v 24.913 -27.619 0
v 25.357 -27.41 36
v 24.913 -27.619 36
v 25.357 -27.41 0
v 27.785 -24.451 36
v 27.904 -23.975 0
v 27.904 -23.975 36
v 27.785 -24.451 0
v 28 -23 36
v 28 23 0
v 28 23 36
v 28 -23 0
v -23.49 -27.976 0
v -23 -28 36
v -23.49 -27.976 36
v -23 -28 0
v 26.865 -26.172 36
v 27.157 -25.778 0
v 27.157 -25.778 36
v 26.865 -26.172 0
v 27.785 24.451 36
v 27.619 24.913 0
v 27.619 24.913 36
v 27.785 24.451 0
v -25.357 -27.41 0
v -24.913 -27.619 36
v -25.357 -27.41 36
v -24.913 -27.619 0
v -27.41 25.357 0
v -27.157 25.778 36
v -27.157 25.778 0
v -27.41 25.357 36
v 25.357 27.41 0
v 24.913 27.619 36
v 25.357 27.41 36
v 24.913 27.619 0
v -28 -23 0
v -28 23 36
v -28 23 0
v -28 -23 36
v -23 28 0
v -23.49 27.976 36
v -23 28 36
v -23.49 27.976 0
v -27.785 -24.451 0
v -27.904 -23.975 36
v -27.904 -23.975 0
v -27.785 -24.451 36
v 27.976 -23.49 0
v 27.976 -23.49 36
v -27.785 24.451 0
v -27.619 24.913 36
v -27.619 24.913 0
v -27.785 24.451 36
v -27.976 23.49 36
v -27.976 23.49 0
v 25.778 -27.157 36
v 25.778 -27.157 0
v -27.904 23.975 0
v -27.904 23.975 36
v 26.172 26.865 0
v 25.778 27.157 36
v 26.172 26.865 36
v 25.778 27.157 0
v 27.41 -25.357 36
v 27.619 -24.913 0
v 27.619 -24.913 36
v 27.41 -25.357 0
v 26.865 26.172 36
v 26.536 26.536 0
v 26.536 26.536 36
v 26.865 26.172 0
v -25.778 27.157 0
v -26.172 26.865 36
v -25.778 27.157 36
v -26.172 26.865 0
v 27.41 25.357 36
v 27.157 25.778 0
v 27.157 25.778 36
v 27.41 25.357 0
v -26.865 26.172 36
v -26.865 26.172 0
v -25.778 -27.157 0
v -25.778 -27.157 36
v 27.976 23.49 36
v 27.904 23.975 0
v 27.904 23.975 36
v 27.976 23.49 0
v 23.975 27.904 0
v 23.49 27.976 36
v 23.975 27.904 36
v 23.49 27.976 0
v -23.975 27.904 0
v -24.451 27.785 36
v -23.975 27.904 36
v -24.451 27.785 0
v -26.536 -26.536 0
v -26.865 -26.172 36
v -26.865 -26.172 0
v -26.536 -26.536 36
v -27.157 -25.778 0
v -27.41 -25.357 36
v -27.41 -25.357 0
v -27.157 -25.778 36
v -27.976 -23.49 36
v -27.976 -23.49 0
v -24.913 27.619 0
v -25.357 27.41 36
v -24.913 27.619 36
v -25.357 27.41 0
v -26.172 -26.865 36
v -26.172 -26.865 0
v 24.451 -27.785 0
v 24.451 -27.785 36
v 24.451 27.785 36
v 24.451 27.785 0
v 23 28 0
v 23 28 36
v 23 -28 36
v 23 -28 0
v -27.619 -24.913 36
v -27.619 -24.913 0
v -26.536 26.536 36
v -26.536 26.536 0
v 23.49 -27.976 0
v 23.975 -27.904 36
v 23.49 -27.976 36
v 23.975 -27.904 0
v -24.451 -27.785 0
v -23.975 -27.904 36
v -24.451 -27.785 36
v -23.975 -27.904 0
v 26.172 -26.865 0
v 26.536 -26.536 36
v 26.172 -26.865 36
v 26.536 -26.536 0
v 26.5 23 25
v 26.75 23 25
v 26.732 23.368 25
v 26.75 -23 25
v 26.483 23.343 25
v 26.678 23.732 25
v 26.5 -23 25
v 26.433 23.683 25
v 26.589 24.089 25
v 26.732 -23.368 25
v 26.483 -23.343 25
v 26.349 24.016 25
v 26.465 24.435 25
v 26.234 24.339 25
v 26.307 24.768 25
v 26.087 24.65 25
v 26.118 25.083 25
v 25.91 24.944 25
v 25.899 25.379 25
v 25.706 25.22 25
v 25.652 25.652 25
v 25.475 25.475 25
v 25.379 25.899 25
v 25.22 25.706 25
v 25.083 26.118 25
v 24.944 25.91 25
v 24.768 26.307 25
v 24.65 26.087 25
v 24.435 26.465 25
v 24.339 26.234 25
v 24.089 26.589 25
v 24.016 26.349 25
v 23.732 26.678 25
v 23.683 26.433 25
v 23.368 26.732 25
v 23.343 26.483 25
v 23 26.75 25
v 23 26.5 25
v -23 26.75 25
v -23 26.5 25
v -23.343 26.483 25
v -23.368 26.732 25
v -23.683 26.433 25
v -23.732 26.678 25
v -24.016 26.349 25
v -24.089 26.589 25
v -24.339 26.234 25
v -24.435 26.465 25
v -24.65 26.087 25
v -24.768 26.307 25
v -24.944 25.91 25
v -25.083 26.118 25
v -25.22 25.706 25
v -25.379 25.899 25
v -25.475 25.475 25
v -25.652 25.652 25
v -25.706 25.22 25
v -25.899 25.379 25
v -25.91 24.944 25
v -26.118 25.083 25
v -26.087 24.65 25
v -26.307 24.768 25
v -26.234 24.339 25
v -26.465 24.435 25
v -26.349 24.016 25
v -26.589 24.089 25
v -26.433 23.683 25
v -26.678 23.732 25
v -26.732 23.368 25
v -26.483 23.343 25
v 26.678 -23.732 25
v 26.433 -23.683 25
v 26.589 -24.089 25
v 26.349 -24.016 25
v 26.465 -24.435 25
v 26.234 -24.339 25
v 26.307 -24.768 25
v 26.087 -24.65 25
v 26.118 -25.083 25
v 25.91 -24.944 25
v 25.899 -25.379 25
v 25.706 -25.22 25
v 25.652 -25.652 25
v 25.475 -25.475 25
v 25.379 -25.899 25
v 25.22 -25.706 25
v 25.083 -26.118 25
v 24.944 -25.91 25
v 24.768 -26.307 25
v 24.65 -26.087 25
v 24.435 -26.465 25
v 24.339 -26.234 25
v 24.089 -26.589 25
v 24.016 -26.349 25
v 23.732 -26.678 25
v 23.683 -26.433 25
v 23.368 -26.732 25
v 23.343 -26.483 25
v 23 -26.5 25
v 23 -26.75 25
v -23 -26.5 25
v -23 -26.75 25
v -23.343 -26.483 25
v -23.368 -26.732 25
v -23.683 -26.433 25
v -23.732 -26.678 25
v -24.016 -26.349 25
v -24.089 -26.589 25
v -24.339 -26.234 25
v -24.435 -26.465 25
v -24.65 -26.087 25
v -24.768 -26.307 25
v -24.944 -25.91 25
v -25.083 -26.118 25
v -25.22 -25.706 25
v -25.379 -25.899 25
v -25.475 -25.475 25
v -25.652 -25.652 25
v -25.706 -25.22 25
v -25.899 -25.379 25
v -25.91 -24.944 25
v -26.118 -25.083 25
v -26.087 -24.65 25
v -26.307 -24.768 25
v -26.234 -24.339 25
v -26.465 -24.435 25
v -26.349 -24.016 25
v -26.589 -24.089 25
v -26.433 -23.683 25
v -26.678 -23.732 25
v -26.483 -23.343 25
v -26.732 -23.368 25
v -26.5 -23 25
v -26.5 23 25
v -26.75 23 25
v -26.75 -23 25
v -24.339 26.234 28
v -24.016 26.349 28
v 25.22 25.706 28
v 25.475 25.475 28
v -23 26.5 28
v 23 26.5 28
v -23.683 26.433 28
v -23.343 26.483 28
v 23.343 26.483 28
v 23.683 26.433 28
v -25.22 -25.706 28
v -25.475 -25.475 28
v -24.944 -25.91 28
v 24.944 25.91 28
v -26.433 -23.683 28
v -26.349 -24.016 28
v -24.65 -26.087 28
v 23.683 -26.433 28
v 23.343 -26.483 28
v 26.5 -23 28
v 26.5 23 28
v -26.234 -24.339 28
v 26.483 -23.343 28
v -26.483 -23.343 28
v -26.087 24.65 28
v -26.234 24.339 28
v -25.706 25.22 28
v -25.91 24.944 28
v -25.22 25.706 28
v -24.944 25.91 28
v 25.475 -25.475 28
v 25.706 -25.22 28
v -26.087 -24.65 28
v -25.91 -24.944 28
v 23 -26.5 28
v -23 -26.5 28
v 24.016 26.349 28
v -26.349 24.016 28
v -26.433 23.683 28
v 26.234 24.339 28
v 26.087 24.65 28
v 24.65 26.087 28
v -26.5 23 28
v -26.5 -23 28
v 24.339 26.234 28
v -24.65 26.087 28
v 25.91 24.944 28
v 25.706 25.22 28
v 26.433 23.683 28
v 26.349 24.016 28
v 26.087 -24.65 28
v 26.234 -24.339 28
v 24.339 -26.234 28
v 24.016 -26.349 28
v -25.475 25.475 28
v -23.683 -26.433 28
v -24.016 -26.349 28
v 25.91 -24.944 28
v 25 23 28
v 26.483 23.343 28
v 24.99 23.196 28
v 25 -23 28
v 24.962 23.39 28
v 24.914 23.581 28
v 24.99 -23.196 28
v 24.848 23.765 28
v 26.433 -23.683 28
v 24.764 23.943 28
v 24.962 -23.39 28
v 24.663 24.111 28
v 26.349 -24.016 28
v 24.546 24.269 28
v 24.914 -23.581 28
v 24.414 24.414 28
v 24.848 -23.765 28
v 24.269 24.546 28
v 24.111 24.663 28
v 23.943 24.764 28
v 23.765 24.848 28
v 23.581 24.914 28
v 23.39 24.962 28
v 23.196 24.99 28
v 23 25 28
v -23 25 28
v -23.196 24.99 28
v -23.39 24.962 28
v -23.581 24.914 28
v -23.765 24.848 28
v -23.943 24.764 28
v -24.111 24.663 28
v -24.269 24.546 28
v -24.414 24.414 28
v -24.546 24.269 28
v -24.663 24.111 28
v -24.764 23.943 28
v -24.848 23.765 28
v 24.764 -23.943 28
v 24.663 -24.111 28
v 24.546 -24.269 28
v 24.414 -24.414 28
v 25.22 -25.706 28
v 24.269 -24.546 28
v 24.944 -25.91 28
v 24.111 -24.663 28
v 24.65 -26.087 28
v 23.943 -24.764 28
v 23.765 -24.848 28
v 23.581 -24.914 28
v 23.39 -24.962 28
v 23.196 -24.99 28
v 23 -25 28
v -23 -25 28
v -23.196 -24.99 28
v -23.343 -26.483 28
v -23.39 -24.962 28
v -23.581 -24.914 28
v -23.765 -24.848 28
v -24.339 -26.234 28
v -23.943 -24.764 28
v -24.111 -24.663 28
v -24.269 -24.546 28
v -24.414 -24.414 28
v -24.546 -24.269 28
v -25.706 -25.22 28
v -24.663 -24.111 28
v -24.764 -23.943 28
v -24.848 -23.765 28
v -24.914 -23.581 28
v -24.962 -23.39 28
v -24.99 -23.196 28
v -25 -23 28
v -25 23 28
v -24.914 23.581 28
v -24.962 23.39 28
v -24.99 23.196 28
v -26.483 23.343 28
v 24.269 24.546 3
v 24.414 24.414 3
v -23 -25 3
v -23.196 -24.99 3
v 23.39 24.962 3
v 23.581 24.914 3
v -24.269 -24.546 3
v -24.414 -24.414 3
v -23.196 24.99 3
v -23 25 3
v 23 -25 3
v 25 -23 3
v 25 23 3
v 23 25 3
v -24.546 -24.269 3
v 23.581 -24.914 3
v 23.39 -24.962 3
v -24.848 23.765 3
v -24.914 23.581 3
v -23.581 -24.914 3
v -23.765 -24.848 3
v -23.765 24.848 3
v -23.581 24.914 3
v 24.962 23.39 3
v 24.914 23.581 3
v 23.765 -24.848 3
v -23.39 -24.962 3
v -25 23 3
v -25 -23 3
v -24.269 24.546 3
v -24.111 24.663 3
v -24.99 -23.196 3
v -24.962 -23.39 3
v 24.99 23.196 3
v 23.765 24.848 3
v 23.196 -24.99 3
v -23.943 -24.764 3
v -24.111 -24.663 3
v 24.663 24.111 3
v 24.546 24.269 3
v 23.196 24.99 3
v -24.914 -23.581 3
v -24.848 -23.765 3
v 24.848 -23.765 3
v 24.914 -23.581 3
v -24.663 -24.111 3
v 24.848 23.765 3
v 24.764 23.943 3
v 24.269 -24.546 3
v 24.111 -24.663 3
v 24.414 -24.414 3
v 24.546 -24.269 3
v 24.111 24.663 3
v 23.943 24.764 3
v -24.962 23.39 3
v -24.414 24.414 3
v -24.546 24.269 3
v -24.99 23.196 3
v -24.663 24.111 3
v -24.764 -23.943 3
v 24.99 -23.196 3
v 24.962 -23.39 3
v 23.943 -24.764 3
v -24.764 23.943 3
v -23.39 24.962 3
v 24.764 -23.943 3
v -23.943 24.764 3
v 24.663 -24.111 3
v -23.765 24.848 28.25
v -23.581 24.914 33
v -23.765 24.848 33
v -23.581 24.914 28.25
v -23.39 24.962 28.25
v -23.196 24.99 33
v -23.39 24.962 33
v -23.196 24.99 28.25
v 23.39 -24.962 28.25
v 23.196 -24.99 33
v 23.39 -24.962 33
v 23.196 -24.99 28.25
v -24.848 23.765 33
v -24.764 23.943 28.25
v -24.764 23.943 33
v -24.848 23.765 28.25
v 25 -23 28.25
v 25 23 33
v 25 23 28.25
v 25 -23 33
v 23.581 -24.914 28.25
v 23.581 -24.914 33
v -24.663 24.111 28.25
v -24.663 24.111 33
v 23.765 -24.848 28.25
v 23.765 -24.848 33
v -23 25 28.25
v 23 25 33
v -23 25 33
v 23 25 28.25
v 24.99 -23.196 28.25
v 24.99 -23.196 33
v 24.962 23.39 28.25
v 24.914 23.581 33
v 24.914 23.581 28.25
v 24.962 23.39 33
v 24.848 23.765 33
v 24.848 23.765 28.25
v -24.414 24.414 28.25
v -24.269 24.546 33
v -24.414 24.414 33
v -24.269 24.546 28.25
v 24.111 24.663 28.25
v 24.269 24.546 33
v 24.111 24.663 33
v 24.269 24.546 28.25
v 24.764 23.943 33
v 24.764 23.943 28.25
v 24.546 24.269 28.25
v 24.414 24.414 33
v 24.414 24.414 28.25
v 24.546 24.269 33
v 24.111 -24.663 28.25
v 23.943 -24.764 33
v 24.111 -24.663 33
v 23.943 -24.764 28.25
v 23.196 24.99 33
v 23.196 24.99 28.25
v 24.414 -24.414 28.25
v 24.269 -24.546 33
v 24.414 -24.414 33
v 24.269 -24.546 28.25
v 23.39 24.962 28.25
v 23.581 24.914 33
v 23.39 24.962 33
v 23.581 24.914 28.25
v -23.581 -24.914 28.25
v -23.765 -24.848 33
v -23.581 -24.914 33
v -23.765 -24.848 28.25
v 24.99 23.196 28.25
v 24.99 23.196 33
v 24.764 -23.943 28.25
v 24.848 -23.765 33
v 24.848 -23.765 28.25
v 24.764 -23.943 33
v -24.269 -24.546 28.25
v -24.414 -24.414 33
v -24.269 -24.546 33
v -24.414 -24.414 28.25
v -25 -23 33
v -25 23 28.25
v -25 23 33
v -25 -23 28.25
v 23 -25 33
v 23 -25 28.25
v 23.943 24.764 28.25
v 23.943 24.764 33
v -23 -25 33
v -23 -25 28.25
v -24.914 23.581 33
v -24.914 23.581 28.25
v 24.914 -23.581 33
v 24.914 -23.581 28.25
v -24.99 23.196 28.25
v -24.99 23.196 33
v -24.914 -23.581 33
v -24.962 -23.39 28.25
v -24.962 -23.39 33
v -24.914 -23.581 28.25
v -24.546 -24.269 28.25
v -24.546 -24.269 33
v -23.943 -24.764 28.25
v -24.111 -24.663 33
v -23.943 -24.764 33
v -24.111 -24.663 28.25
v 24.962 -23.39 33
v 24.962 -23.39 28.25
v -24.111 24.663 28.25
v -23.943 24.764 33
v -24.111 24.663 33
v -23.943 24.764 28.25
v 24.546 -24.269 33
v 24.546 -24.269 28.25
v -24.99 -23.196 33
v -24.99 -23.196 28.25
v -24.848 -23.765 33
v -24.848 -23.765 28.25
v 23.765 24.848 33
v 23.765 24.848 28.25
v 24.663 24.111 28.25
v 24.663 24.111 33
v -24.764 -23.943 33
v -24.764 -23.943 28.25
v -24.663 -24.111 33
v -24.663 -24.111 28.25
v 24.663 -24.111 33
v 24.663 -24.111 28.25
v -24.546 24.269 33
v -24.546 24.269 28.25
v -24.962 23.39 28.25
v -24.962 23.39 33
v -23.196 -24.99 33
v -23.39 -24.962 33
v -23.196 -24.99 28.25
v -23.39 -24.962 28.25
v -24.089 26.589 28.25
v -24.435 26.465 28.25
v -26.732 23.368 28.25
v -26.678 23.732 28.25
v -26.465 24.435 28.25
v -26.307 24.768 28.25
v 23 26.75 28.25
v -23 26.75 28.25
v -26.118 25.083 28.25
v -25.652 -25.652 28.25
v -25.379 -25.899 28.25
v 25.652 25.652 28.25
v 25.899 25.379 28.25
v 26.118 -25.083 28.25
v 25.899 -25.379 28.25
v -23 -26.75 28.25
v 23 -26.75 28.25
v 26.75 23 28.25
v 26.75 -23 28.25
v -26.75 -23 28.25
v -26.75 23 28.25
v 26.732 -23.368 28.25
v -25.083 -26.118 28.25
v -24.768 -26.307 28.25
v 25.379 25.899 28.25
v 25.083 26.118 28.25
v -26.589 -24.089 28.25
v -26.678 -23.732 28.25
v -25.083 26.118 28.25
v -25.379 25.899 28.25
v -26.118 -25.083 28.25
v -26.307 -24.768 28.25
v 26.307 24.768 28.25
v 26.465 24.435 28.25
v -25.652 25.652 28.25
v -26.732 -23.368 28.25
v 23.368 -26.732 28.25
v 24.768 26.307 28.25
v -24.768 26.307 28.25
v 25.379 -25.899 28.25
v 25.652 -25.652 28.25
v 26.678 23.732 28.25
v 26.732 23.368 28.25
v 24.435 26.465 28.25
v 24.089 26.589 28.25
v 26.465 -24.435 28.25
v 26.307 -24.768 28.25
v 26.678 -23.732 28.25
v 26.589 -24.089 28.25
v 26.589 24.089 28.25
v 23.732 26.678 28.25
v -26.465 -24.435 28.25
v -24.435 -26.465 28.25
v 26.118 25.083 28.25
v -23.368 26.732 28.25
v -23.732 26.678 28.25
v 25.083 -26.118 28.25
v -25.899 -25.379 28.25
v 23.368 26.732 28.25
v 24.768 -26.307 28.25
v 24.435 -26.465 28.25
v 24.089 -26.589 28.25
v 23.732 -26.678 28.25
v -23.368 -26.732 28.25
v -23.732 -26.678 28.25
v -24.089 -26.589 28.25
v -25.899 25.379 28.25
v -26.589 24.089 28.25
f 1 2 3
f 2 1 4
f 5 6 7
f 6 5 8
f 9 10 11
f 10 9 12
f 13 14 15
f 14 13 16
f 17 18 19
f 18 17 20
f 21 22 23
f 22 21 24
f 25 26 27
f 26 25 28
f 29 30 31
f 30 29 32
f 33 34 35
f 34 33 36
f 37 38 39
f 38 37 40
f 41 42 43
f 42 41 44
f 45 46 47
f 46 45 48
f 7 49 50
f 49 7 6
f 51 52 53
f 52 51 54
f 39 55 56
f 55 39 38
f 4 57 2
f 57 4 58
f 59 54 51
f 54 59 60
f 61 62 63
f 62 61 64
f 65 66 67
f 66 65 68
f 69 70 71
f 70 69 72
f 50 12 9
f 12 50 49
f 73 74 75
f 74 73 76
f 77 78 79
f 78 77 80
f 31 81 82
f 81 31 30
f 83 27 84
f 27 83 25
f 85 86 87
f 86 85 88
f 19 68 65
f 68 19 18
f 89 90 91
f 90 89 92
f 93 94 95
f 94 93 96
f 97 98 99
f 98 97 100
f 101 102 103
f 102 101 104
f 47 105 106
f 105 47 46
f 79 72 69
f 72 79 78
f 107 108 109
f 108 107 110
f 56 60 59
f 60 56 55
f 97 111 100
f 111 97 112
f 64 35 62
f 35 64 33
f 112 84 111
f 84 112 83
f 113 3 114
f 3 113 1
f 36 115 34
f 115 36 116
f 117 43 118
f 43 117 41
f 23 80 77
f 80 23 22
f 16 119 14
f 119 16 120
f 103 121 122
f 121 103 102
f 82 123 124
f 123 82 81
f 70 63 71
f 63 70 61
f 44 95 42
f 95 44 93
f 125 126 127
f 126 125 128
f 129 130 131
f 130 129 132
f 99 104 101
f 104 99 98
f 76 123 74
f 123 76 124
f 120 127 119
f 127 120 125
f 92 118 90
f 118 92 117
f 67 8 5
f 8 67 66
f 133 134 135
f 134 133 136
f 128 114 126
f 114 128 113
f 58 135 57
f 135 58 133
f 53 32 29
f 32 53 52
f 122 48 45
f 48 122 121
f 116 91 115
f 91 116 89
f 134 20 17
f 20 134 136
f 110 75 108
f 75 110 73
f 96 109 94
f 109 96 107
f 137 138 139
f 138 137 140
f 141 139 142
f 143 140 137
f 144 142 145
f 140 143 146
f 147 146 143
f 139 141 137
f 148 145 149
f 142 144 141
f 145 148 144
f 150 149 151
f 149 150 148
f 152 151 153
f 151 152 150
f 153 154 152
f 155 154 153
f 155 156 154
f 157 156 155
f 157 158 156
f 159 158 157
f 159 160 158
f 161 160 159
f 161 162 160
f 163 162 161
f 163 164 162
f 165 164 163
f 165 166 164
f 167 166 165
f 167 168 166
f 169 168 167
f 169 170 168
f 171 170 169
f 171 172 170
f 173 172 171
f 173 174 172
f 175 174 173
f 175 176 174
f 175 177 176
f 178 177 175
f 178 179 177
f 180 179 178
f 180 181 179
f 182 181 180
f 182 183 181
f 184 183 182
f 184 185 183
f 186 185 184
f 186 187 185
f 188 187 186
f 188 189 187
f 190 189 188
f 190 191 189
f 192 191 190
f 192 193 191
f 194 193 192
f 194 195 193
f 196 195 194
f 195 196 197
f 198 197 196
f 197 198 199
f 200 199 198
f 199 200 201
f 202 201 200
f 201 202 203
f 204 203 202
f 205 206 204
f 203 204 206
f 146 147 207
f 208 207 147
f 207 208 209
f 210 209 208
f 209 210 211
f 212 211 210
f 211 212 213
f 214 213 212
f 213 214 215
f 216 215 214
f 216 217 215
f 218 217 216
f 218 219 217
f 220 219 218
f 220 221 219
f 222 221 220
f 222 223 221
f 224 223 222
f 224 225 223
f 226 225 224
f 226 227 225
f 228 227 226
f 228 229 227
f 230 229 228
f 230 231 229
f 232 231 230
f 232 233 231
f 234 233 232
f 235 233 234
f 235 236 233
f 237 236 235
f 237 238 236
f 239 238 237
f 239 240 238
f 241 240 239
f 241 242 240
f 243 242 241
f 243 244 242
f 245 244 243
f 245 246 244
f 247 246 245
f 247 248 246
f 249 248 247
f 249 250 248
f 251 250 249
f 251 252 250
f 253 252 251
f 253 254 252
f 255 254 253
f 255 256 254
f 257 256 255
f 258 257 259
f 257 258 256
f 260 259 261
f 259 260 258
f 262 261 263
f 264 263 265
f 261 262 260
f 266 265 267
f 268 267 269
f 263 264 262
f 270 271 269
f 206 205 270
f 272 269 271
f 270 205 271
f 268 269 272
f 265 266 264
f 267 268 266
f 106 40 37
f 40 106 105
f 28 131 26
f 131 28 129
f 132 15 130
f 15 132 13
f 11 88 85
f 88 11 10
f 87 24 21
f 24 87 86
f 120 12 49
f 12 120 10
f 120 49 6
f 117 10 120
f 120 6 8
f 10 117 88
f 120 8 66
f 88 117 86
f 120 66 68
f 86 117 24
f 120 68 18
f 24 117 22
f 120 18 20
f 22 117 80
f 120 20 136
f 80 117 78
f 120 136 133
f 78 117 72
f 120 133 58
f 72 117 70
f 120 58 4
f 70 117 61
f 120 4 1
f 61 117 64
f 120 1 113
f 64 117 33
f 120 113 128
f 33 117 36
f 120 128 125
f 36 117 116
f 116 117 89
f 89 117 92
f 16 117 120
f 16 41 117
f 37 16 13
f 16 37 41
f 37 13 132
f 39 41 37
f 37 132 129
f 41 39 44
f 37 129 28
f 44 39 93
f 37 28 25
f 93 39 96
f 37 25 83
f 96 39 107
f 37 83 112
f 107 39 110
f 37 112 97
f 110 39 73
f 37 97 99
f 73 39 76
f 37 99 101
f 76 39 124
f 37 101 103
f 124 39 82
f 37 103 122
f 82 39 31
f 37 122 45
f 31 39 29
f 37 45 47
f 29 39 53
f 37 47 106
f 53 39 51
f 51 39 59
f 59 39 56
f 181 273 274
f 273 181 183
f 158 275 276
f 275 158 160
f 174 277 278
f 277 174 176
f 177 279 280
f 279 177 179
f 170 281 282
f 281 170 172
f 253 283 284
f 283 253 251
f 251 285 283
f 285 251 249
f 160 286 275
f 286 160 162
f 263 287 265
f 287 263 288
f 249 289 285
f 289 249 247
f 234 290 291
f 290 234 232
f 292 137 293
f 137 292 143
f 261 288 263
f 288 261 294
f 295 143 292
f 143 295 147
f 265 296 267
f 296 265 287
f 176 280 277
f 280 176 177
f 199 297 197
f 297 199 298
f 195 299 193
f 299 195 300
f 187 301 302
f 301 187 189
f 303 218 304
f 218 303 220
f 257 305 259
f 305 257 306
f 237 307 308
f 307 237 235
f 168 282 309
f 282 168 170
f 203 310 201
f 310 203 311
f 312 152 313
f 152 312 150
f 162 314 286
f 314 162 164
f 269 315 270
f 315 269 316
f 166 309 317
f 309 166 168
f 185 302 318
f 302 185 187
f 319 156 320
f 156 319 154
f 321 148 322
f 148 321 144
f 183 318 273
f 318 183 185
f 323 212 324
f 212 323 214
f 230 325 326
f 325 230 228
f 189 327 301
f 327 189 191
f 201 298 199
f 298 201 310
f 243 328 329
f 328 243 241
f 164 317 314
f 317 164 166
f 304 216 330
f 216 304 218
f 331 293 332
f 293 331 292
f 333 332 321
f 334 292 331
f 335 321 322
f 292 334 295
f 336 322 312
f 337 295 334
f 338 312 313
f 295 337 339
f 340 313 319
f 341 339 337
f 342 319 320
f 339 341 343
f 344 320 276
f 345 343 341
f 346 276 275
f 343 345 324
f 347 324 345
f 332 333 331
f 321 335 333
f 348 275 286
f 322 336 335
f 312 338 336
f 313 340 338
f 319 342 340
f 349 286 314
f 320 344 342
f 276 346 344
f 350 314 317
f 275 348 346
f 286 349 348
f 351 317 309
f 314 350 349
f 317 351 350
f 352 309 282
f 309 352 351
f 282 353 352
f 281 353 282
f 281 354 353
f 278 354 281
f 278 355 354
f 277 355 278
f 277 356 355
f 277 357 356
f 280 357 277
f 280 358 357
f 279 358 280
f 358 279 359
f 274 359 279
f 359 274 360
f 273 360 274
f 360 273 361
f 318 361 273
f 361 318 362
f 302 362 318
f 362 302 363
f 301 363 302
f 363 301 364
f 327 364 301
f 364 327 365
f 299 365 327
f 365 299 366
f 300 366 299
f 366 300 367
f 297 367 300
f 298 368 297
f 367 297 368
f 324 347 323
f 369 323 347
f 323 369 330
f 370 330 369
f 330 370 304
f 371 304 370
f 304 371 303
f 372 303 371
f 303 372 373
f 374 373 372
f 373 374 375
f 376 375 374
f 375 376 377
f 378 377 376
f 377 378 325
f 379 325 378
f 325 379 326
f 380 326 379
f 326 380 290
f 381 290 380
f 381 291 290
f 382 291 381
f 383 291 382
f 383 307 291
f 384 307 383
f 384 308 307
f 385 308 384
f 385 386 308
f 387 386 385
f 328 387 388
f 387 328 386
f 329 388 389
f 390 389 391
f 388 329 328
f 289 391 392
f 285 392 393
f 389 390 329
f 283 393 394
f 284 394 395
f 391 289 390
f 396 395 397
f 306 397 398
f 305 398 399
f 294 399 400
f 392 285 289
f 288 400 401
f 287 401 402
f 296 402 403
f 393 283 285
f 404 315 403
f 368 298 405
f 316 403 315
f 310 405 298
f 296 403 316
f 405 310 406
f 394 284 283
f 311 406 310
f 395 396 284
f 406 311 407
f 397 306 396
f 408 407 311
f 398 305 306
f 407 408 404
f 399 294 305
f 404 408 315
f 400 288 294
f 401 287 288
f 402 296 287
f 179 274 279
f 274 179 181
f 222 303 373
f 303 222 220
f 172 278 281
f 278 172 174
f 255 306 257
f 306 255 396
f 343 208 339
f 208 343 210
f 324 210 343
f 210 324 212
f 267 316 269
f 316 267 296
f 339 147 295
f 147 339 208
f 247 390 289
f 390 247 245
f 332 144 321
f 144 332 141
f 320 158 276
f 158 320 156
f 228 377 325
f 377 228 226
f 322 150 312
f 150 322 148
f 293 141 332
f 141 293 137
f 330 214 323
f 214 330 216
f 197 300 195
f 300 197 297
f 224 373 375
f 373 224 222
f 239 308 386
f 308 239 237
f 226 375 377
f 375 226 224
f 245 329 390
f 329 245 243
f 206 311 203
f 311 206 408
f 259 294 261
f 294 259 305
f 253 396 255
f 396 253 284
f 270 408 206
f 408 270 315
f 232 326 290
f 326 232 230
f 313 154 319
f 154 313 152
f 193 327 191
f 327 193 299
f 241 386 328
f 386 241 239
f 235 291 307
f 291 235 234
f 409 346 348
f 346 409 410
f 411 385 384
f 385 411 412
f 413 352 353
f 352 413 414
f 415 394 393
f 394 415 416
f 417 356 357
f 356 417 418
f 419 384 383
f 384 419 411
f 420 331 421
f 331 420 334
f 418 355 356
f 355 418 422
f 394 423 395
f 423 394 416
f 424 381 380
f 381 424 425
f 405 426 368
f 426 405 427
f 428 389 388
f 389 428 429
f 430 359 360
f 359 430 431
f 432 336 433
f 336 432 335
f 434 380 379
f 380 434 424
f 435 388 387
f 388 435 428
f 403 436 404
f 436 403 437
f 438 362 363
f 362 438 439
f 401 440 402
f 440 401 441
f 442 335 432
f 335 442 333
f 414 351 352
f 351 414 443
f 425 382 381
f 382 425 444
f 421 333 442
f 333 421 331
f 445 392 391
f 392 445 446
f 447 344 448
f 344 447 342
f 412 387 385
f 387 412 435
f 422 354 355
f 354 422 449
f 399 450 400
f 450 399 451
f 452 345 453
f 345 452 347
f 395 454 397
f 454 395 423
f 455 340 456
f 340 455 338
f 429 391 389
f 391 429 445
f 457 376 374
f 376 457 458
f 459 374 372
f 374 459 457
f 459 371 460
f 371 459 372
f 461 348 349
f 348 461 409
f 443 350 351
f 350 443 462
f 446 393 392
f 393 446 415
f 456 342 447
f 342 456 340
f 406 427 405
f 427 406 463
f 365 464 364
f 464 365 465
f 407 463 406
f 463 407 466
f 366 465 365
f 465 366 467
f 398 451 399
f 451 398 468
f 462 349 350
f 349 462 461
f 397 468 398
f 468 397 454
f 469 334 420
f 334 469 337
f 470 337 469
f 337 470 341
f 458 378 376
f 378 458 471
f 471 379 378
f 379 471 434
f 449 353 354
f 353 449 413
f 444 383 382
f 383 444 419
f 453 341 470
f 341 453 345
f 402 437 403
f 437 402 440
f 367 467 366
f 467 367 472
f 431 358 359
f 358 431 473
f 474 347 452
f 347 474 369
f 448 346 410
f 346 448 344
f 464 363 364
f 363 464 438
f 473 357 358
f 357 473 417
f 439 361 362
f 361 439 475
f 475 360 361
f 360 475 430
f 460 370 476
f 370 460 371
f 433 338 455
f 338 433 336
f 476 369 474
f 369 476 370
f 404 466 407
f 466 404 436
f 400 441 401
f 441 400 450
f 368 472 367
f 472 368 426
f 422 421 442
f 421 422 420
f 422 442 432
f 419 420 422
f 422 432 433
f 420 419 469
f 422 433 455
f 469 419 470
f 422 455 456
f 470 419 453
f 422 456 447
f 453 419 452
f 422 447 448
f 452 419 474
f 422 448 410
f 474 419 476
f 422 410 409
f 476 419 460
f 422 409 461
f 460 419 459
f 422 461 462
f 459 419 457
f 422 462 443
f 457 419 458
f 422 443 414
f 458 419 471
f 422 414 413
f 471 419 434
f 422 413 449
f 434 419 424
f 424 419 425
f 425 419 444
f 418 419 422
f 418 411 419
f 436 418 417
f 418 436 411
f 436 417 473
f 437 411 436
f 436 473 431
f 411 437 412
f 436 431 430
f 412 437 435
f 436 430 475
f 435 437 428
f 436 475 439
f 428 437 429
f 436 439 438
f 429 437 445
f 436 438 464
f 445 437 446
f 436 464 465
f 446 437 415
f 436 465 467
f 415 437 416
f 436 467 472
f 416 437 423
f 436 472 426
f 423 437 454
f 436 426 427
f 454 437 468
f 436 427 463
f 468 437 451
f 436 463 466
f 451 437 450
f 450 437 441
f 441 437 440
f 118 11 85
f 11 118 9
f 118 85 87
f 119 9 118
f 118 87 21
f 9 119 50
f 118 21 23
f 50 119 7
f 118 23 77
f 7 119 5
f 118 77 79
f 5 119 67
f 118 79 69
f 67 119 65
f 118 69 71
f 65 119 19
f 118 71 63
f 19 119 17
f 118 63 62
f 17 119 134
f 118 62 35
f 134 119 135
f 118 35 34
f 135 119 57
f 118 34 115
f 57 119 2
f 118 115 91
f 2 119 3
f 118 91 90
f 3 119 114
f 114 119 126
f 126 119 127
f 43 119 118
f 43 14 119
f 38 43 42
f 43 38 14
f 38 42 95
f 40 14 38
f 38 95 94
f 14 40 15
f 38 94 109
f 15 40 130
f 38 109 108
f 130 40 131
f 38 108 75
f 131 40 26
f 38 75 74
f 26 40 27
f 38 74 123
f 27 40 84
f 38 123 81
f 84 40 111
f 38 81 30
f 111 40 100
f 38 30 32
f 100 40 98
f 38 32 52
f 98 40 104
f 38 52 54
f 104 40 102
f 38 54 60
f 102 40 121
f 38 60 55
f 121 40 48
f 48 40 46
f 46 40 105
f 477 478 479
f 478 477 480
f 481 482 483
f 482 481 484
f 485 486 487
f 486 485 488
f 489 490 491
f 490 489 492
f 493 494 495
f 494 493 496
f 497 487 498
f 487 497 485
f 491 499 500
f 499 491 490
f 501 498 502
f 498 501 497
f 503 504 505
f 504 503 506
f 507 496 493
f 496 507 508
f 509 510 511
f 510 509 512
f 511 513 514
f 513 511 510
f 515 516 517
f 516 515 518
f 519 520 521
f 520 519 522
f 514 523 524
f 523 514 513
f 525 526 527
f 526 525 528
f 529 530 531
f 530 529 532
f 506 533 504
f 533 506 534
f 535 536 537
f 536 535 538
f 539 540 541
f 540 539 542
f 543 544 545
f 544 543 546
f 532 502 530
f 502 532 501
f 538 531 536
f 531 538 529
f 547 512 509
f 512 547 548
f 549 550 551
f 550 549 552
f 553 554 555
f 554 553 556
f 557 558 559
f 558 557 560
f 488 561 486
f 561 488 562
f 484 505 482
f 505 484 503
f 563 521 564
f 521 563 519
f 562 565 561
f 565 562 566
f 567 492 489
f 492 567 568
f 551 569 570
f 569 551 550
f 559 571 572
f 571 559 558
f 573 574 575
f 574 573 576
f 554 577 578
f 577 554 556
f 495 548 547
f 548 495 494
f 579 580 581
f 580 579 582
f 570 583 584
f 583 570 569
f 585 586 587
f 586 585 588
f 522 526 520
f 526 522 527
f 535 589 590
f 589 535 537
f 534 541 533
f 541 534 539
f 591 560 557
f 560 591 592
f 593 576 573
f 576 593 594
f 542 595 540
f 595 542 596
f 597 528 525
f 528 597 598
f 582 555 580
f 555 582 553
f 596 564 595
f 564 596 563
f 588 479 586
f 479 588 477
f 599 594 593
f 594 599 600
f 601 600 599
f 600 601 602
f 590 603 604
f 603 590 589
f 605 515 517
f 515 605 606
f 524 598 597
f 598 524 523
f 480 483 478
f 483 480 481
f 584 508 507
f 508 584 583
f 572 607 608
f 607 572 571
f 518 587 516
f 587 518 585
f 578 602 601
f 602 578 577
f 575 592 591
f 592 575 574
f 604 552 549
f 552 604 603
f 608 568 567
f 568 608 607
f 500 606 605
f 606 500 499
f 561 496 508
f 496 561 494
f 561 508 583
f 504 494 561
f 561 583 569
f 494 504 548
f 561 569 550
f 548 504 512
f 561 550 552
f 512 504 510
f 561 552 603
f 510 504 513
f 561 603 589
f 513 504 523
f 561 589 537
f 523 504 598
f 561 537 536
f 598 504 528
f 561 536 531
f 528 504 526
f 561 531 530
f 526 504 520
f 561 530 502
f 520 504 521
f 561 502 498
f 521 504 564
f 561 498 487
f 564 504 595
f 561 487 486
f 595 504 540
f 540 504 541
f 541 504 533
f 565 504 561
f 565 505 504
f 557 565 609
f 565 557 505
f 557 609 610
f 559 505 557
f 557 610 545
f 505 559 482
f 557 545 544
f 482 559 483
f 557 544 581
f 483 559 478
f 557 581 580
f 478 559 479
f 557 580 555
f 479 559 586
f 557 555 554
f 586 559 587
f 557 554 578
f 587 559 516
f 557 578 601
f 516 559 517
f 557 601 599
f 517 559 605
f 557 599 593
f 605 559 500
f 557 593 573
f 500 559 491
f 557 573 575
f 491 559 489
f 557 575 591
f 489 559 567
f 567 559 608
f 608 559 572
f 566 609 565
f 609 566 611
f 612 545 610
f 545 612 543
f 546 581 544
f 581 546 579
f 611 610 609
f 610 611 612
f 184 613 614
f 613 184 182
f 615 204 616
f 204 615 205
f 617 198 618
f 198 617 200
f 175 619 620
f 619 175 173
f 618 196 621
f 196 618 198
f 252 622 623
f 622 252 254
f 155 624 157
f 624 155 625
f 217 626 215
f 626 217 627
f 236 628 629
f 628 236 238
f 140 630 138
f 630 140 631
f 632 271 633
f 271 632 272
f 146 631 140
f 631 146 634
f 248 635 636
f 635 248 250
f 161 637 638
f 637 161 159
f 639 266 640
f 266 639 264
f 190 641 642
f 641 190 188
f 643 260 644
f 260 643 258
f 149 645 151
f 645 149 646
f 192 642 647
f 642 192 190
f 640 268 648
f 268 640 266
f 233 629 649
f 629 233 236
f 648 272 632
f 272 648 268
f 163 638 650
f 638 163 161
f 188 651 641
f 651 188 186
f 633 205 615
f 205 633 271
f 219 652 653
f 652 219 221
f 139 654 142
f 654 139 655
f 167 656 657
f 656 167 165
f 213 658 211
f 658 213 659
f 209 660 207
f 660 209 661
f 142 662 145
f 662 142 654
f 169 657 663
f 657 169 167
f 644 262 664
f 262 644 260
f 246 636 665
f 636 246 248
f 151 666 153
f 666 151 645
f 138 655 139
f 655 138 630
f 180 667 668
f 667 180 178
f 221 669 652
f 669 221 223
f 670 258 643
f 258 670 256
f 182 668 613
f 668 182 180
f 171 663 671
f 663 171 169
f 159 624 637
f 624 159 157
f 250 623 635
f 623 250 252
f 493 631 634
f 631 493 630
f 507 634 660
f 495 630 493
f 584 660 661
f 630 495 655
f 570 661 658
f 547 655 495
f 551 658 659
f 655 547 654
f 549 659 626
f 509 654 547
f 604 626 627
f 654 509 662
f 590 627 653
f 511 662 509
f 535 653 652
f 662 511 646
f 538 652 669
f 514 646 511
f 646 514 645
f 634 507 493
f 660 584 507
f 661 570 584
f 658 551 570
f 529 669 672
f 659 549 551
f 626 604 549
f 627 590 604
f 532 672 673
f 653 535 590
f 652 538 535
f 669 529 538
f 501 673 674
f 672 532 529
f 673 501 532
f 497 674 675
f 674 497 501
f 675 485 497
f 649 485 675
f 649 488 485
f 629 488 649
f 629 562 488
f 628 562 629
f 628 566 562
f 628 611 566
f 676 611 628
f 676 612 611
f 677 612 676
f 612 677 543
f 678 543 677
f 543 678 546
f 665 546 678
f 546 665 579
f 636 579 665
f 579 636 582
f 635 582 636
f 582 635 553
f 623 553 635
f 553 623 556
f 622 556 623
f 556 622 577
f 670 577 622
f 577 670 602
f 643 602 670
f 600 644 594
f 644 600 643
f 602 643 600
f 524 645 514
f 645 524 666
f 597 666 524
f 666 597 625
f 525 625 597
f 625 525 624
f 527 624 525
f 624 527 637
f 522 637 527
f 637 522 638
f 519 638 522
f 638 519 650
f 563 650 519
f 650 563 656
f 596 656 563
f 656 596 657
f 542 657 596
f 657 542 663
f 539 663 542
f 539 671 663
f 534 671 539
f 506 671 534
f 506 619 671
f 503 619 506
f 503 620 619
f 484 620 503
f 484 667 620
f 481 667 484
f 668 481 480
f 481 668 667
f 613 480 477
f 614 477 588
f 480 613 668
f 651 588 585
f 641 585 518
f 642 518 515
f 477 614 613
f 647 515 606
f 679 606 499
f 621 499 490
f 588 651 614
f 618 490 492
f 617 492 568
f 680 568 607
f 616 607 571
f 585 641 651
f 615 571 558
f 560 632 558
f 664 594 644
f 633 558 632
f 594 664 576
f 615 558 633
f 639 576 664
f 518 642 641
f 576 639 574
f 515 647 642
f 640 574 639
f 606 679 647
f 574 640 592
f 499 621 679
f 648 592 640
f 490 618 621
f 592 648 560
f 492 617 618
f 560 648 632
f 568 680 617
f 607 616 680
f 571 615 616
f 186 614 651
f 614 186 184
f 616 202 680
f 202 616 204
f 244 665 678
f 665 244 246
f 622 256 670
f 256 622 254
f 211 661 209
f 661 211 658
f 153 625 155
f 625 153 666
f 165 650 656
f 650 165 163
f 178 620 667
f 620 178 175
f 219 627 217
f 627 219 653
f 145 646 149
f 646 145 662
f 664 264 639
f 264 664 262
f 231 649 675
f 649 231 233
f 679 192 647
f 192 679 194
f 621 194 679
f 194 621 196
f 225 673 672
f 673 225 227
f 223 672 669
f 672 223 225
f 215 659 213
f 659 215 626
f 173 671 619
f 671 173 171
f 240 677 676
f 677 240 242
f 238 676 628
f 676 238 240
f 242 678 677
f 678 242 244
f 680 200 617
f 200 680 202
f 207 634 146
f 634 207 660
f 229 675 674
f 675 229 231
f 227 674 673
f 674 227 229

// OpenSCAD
// =========================================================================
// 3D-PRINTABLE TWO-PART ENCLOSURE WITH STEP JOINT
// Designed with Design-for-Manufacturing (DFM) Principles
// Features: Rounded corners to prevent warping/stress, 
//           built-in self-aligning step joint, and 
//           proper 3D-printing tolerances.
// =========================================================================

/* [Enclosure Dimensions] */
// Minimum internal cavity dimensions
cavity_width = 50.0;
cavity_length = 50.0;
cavity_height = 30.0;
wall_thickness = 3.0;

/* [Printer & Joint Tolerances] */
// Radial and vertical clearance between mating surfaces
clearance = 0.25; 

/* [Aesthetics] */
// Outer corner radius (must be greater than wall_thickness)
r_ext = 5.0;

/* [Visualization] */
// Explode distance to inspect the joint (set to 0 for assembled view)
explode = 0.0; 

/* [Derived Parameters] */
r_int = max(0.1, r_ext - wall_thickness);
ext_width = cavity_width + 2 * wall_thickness;
ext_length = cavity_length + 2 * wall_thickness;
ext_height = cavity_height + 2 * wall_thickness;

// Split height (Base outer height - approximately 70% of total height)
base_height_ext = round((cavity_height + 2 * wall_thickness) * 0.7);
lid_height_ext = ext_height - base_height_ext;

// Joint Dimensions
lip_height = 3.0;
lip_thickness = wall_thickness / 2;

$fn = 64;

// Helper module for a robust rounded column
module rounded_column(size, r) {
    x = size[0];
    y = size[1];
    z = size[2];
    hull() {
        translate([-x/2 + r, -y/2 + r, 0]) cylinder(r=r, h=z);
        translate([ x/2 - r, -y/2 + r, 0]) cylinder(r=r, h=z);
        translate([-x/2 + r,  y/2 - r, 0]) cylinder(r=r, h=z);
        translate([ x/2 - r,  y/2 - r, 0]) cylinder(r=r, h=z);
    }
}

// Base Component
module base() {
    color("LightBlue") {
        difference() {
            union() {
                // Main outer body of base
                rounded_column([ext_width, ext_length, base_height_ext], r_ext);
                
                // Mating lip extending upwards
                translate([0, 0, base_height_ext])
                    rounded_column([
                        cavity_width + 2 * lip_thickness, 
                        cavity_length + 2 * lip_thickness, 
                        lip_height
                    ], r_int + lip_thickness);
            }
            
            // Inner cavity carve-out
            translate([0, 0, wall_thickness])
                rounded_column([cavity_width, cavity_length, ext_height], r_int);
        }
    }
}

// Lid Component
module lid() {
    color("LightGreen") {
        translate([0, 0, explode]) {
            difference() {
                // Main outer body of lid
                translate([0, 0, base_height_ext])
                    rounded_column([ext_width, ext_length, lid_height_ext], r_ext);
                
                // Inner cavity carve-out for lid portion
                translate([0, 0, base_height_ext])
                    rounded_column([cavity_width, cavity_length, lid_height_ext - wall_thickness], r_int);
                
                // Recess for base lip with tolerance clearance added
                translate([0, 0, base_height_ext - 0.1])
                    rounded_column([
                        cavity_width + 2 * lip_thickness + 2 * clearance, 
                        cavity_length + 2 * lip_thickness + 2 * clearance, 
                        lip_height + clearance + 0.1
                    ], r_int + lip_thickness + clearance);
            }
        }
    }
}

// Render both parts in their specified positions
base();
lid();
